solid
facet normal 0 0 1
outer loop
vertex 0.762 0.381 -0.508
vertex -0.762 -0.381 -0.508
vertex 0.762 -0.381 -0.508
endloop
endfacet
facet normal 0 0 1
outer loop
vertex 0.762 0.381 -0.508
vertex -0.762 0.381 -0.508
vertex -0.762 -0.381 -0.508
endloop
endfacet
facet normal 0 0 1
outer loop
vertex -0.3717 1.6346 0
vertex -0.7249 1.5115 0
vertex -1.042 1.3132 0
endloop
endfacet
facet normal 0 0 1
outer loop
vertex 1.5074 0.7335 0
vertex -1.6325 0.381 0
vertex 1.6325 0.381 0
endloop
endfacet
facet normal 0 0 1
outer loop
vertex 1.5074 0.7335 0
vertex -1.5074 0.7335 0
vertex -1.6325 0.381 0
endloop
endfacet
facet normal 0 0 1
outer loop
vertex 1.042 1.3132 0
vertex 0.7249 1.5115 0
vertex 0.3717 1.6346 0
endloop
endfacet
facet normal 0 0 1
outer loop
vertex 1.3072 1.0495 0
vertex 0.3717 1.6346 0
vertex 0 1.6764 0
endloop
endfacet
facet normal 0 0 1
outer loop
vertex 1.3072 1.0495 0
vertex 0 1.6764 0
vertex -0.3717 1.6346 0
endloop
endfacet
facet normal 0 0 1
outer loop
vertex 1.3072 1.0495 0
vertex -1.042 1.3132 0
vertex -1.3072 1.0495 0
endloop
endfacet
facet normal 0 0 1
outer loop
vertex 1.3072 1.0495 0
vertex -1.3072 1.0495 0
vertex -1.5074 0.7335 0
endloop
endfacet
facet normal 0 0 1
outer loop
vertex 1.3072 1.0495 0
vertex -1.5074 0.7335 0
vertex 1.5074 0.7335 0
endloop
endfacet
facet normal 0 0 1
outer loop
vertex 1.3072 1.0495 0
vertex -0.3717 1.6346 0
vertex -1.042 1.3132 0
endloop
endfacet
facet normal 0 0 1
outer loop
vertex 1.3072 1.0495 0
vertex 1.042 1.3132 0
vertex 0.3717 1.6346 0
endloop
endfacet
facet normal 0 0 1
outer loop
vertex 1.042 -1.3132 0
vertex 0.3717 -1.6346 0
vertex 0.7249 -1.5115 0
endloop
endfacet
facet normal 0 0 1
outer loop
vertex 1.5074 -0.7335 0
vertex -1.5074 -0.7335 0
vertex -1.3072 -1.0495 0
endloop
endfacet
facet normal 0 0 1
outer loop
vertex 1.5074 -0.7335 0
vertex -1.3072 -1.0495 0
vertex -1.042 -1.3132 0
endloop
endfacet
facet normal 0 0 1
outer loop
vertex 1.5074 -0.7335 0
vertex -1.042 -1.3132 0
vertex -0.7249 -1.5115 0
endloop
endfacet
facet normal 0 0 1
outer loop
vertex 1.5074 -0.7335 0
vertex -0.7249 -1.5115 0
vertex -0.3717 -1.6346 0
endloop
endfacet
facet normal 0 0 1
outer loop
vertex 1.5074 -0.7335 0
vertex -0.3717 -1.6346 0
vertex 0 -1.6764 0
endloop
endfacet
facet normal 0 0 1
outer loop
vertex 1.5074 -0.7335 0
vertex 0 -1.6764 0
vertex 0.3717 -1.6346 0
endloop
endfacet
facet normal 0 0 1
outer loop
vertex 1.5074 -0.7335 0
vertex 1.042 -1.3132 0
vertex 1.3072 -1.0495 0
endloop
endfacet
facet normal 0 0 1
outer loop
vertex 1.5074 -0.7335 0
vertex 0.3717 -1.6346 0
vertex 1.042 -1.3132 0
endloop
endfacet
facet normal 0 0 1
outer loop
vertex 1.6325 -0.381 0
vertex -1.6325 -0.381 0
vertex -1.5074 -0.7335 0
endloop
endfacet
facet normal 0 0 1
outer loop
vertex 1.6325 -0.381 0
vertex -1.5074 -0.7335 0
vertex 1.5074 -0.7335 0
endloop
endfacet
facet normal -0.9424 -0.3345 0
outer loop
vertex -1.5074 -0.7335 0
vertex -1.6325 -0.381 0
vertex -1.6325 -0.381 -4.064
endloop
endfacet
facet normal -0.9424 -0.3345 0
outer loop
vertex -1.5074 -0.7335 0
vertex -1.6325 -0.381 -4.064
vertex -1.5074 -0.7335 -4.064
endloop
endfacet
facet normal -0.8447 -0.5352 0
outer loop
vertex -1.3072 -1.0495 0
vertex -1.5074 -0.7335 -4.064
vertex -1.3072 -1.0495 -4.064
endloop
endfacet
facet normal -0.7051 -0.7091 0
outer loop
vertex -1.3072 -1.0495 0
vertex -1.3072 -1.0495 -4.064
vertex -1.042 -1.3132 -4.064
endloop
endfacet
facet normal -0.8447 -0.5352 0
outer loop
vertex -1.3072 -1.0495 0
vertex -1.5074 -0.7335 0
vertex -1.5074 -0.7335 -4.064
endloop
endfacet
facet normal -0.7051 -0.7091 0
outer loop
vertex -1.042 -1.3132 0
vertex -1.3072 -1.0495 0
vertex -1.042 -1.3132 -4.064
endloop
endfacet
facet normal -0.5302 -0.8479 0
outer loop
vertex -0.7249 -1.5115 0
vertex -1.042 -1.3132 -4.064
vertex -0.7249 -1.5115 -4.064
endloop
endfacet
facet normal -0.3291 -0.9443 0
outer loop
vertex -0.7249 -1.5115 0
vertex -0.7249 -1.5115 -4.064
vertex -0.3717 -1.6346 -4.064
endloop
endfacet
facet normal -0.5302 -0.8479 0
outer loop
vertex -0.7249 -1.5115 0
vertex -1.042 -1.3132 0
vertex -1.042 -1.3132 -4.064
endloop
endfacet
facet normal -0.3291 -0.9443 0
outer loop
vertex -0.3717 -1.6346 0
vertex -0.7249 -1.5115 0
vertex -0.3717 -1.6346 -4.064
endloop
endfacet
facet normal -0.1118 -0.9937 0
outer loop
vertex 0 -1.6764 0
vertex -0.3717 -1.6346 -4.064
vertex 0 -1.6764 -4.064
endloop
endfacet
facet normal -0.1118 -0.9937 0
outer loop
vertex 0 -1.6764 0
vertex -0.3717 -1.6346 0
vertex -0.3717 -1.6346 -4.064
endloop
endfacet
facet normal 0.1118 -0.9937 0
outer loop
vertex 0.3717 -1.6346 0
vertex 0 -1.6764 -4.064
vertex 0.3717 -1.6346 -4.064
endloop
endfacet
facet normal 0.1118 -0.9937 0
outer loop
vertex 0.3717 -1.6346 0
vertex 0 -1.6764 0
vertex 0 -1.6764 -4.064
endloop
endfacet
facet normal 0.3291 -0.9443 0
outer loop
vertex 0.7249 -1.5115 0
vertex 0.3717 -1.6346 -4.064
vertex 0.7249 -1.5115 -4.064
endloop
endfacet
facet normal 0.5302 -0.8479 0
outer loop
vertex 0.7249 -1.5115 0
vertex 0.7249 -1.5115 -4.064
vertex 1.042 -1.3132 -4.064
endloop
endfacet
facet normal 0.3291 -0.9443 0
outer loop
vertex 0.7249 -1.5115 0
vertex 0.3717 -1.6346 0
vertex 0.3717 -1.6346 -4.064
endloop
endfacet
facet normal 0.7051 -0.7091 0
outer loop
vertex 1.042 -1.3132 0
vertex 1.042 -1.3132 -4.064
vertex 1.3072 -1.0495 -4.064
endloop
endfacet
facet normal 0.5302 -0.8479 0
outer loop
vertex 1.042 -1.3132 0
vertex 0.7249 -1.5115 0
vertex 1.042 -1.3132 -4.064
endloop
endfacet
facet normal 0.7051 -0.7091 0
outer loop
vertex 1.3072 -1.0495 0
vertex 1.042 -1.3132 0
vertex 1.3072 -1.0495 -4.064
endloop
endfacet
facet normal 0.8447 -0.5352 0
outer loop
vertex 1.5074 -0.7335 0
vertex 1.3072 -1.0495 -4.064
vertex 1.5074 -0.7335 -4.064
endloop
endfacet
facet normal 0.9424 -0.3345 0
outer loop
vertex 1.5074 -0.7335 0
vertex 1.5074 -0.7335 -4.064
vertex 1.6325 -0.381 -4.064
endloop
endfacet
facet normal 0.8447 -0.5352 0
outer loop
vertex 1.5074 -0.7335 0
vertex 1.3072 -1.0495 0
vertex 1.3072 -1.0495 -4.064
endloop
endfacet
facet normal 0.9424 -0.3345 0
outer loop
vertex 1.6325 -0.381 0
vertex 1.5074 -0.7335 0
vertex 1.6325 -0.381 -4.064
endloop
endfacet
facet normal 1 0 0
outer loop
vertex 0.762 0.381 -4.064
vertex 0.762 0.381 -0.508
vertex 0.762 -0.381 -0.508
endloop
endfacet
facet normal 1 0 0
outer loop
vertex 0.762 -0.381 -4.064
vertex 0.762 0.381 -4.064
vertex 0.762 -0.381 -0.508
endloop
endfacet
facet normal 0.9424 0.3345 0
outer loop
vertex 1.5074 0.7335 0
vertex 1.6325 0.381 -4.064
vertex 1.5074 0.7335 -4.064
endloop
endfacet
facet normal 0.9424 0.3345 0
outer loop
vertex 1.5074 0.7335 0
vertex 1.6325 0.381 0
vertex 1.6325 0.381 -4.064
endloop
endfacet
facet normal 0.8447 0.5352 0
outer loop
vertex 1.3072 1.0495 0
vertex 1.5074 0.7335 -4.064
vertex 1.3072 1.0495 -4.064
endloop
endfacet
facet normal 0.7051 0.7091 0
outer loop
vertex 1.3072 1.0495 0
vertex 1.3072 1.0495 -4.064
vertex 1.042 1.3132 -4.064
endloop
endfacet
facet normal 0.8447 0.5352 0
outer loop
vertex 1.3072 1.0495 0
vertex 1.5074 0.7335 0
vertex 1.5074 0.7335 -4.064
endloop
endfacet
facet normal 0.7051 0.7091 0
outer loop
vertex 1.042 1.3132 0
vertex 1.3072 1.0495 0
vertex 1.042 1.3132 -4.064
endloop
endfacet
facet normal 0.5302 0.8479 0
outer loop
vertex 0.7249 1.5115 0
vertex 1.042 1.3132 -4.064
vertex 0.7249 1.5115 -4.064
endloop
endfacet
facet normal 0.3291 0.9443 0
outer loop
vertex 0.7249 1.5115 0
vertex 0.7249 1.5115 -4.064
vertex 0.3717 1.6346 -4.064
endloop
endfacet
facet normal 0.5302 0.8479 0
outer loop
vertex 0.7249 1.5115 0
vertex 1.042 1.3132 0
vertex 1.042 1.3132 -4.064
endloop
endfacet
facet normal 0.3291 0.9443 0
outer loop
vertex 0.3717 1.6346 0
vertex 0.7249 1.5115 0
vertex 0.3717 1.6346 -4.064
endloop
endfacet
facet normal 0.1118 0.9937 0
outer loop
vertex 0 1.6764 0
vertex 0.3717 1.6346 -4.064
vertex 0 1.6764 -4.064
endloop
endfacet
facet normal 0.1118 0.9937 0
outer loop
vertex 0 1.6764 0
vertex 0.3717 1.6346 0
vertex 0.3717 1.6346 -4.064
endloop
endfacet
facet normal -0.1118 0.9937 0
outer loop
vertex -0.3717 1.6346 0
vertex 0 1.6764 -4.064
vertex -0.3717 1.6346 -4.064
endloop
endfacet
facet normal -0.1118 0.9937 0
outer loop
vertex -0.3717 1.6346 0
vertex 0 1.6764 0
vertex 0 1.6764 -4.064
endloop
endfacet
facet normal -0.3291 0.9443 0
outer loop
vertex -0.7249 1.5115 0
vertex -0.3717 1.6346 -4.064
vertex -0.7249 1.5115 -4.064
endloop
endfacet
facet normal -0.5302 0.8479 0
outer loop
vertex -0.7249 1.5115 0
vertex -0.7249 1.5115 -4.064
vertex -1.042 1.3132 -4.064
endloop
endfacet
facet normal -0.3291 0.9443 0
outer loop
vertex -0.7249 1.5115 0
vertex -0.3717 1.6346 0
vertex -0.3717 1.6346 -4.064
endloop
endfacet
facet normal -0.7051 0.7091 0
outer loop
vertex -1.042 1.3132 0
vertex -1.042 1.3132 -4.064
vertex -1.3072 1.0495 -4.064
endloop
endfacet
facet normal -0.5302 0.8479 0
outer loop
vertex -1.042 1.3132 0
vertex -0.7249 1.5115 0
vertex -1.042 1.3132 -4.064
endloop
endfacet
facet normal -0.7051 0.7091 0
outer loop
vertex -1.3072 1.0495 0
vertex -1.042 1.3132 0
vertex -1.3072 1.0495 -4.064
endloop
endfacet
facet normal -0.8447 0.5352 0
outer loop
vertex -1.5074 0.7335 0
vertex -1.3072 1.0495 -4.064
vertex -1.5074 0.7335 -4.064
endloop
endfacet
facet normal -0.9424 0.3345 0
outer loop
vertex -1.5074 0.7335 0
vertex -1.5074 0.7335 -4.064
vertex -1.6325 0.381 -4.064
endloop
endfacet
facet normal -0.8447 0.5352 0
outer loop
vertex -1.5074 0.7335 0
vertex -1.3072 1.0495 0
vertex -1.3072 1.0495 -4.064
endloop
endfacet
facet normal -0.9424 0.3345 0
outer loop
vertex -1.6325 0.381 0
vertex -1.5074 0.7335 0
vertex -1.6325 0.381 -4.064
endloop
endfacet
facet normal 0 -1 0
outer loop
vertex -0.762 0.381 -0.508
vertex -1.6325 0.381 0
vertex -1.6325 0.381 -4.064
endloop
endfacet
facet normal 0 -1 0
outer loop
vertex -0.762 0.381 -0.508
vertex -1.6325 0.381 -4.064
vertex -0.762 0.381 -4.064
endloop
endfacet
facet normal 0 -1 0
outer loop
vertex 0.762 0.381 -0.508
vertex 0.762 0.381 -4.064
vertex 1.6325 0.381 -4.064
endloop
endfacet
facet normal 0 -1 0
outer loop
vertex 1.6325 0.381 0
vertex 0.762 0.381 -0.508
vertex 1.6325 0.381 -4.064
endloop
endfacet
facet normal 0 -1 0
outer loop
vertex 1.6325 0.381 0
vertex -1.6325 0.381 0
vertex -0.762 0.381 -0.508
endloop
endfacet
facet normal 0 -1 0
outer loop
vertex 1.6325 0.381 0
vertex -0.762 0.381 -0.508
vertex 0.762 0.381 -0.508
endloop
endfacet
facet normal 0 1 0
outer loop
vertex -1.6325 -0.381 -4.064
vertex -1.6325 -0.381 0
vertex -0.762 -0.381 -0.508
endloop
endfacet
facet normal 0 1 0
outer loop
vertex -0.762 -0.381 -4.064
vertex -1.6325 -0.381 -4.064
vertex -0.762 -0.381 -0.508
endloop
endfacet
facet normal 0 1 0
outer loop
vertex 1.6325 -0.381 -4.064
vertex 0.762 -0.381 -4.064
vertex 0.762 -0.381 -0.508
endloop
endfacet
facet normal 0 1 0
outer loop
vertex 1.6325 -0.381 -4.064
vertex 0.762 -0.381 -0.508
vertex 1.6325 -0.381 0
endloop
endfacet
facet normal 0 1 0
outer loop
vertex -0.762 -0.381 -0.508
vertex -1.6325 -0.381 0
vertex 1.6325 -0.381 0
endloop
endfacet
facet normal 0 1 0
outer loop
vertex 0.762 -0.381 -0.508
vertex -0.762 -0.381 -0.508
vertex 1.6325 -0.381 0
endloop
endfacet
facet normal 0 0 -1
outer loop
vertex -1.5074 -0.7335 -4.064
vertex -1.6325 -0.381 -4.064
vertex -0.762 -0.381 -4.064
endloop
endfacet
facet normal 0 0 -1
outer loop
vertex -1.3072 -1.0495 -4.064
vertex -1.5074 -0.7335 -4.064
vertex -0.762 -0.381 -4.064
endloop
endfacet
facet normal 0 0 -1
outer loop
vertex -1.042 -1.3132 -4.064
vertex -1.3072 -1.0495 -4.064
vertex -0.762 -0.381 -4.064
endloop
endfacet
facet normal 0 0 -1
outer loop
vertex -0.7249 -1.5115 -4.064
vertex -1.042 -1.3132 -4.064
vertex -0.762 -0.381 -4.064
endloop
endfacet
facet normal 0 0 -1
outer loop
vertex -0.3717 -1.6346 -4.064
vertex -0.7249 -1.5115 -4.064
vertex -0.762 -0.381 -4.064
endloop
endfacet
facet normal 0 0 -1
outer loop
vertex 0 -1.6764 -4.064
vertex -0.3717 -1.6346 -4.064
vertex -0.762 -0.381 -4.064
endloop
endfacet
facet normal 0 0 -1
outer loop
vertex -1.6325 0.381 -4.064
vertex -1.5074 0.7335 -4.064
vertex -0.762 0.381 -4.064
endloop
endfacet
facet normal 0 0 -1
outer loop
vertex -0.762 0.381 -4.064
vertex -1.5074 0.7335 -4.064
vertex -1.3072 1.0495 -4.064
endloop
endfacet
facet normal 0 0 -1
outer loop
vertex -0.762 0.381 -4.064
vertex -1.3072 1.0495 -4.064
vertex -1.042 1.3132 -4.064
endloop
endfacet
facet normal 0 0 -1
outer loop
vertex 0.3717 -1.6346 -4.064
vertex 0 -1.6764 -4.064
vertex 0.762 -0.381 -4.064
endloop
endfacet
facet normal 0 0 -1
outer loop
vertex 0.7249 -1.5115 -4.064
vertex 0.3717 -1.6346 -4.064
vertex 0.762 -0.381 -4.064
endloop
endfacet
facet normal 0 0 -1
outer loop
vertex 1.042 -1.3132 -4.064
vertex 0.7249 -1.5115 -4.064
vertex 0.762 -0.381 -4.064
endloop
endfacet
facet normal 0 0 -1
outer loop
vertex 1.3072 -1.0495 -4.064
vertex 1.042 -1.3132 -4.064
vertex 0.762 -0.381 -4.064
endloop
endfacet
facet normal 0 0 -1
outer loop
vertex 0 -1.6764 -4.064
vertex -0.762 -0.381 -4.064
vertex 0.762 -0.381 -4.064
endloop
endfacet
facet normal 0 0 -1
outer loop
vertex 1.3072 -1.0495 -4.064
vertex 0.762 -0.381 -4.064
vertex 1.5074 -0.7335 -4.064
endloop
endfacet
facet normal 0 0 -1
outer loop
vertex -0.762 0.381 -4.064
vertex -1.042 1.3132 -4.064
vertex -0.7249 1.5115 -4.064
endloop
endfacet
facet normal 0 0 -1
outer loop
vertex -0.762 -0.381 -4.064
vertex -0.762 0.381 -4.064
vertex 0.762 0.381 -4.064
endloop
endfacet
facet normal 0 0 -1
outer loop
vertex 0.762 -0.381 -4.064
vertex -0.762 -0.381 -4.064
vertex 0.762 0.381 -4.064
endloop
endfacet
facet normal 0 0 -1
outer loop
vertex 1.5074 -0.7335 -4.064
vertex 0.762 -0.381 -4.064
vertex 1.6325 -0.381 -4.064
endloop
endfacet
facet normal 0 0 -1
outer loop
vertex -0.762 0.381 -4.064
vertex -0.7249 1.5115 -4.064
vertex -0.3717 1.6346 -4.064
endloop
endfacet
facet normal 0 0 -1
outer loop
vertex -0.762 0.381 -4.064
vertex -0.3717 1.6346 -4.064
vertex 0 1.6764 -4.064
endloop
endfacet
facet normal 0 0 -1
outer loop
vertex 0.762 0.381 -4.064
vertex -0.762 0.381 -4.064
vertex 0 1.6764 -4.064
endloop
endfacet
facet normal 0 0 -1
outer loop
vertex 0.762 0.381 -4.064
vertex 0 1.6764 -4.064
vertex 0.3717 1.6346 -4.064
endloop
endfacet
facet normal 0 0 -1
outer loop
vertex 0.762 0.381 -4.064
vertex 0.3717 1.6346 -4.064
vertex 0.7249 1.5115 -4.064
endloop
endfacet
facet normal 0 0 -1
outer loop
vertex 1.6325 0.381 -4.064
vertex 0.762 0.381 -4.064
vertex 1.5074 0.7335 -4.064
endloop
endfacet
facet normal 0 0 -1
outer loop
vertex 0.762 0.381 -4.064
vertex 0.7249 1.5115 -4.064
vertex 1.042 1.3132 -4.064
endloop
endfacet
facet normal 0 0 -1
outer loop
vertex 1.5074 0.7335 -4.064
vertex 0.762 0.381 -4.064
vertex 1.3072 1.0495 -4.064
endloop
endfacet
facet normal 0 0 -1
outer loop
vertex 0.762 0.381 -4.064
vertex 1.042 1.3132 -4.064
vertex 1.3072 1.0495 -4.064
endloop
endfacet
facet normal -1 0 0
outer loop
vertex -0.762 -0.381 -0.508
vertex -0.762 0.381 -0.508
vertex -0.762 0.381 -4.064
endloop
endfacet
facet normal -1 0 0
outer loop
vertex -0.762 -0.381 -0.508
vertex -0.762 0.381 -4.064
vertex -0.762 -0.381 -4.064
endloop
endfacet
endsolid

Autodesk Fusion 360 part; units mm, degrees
sketch "Sketch1" plane through (0, 0, 0) normal (0, 0, 1) x (1, 0, 0)
  line L0 (-1.6325, 0.381) -> (1.6325, 0.381)
  line L1 (-1.6325, -0.381) -> (1.6325, -0.381)
  line L2 (-0.762, 0) -> (0.762, 0) construction
  line L3 (0, 1.6764) -> (0, -1.6764) construction
  line L4 (-0.762, 0.381) -> (-0.762, -0.381)
  line L5 (0.762, 0.381) -> (0.762, -0.381)
  arc A0 (1.6325, 0.381) -> (-1.6325, 0.381) centre (0, 0) ccw
  arc A1 (-1.6325, -0.381) -> (1.6325, -0.381) centre (0, 0) ccw
  dimension "d1" = 3.3528
  dimension "d2" = 0.762
  dimension "d3" = 1.524
extrude "Extrude1" add sketch "Sketch1" against normal blind 4.064
extrude "Extrude2" cut sketch "Sketch1" against normal blind 0.508 contours L0 L1 L4 L5
